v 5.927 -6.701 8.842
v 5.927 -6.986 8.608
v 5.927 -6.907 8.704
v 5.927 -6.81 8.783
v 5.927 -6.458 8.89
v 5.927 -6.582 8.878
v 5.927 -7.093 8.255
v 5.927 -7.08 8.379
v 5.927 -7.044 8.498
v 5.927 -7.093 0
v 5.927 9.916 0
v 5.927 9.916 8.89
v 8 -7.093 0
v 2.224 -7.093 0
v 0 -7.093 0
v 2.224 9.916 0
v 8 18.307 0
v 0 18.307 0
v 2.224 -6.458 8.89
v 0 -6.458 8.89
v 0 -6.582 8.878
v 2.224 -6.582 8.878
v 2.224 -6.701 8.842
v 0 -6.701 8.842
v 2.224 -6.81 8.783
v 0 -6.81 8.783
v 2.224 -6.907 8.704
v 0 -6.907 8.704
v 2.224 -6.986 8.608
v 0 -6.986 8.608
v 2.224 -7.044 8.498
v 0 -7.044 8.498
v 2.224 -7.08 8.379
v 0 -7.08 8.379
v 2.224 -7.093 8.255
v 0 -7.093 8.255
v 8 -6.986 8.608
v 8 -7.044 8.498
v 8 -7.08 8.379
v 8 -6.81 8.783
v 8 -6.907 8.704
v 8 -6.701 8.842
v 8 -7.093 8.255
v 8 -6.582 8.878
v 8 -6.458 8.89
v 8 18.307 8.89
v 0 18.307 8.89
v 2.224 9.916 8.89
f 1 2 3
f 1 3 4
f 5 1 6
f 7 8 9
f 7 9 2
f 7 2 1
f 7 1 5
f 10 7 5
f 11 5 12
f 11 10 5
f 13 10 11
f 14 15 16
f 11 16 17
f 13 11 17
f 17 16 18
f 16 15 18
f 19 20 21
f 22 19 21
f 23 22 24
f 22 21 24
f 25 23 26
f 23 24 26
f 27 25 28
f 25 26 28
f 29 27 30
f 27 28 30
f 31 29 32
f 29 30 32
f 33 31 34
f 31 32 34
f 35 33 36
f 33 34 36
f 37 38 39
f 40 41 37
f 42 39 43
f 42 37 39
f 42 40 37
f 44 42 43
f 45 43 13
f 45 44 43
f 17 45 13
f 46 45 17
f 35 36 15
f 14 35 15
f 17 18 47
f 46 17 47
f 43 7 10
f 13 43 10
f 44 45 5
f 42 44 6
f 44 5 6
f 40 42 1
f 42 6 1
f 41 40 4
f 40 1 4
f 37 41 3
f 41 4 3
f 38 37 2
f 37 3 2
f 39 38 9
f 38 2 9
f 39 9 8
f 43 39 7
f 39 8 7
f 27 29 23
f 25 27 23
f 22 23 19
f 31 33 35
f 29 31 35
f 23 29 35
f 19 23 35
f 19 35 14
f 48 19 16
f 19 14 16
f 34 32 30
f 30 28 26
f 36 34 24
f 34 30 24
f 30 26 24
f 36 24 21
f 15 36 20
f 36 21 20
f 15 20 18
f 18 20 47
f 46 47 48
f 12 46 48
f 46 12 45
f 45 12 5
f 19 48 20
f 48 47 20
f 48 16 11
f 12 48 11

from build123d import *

# Parameters (mm, degrees)
F1_DEPTH = 8
F2_W     = 3.703703
F2_H     = 20
F3_DEPTH = 9.30533


with BuildPart() as f1:
    # F0 (on Right) → F1 (new body)
    with BuildSketch(Plane.YZ):
        with BuildLine():
            Line((18.307374, 8.89), (-6.457626, 8.89))
            ThreePointArc((-6.457626, 8.89), (-6.906639, 8.704013), (-7.092626, 8.255))
            Line((-7.092626, 8.255), (-7.092626, 0))
            Line((-7.092626, 0), (18.307374, 0))
            Line((18.307374, 0), (18.307374, 8.89))
        make_face()
    extrude(amount=F1_DEPTH)

    # F2 (on Top) → F3 (cut)
    with BuildSketch(Plane.XY):
        with Locations((4.075629, -0.084073)):
            Rectangle(F2_W, F2_H)
    extrude(amount=F3_DEPTH, mode=Mode.SUBTRACT)


solid = f1.part
